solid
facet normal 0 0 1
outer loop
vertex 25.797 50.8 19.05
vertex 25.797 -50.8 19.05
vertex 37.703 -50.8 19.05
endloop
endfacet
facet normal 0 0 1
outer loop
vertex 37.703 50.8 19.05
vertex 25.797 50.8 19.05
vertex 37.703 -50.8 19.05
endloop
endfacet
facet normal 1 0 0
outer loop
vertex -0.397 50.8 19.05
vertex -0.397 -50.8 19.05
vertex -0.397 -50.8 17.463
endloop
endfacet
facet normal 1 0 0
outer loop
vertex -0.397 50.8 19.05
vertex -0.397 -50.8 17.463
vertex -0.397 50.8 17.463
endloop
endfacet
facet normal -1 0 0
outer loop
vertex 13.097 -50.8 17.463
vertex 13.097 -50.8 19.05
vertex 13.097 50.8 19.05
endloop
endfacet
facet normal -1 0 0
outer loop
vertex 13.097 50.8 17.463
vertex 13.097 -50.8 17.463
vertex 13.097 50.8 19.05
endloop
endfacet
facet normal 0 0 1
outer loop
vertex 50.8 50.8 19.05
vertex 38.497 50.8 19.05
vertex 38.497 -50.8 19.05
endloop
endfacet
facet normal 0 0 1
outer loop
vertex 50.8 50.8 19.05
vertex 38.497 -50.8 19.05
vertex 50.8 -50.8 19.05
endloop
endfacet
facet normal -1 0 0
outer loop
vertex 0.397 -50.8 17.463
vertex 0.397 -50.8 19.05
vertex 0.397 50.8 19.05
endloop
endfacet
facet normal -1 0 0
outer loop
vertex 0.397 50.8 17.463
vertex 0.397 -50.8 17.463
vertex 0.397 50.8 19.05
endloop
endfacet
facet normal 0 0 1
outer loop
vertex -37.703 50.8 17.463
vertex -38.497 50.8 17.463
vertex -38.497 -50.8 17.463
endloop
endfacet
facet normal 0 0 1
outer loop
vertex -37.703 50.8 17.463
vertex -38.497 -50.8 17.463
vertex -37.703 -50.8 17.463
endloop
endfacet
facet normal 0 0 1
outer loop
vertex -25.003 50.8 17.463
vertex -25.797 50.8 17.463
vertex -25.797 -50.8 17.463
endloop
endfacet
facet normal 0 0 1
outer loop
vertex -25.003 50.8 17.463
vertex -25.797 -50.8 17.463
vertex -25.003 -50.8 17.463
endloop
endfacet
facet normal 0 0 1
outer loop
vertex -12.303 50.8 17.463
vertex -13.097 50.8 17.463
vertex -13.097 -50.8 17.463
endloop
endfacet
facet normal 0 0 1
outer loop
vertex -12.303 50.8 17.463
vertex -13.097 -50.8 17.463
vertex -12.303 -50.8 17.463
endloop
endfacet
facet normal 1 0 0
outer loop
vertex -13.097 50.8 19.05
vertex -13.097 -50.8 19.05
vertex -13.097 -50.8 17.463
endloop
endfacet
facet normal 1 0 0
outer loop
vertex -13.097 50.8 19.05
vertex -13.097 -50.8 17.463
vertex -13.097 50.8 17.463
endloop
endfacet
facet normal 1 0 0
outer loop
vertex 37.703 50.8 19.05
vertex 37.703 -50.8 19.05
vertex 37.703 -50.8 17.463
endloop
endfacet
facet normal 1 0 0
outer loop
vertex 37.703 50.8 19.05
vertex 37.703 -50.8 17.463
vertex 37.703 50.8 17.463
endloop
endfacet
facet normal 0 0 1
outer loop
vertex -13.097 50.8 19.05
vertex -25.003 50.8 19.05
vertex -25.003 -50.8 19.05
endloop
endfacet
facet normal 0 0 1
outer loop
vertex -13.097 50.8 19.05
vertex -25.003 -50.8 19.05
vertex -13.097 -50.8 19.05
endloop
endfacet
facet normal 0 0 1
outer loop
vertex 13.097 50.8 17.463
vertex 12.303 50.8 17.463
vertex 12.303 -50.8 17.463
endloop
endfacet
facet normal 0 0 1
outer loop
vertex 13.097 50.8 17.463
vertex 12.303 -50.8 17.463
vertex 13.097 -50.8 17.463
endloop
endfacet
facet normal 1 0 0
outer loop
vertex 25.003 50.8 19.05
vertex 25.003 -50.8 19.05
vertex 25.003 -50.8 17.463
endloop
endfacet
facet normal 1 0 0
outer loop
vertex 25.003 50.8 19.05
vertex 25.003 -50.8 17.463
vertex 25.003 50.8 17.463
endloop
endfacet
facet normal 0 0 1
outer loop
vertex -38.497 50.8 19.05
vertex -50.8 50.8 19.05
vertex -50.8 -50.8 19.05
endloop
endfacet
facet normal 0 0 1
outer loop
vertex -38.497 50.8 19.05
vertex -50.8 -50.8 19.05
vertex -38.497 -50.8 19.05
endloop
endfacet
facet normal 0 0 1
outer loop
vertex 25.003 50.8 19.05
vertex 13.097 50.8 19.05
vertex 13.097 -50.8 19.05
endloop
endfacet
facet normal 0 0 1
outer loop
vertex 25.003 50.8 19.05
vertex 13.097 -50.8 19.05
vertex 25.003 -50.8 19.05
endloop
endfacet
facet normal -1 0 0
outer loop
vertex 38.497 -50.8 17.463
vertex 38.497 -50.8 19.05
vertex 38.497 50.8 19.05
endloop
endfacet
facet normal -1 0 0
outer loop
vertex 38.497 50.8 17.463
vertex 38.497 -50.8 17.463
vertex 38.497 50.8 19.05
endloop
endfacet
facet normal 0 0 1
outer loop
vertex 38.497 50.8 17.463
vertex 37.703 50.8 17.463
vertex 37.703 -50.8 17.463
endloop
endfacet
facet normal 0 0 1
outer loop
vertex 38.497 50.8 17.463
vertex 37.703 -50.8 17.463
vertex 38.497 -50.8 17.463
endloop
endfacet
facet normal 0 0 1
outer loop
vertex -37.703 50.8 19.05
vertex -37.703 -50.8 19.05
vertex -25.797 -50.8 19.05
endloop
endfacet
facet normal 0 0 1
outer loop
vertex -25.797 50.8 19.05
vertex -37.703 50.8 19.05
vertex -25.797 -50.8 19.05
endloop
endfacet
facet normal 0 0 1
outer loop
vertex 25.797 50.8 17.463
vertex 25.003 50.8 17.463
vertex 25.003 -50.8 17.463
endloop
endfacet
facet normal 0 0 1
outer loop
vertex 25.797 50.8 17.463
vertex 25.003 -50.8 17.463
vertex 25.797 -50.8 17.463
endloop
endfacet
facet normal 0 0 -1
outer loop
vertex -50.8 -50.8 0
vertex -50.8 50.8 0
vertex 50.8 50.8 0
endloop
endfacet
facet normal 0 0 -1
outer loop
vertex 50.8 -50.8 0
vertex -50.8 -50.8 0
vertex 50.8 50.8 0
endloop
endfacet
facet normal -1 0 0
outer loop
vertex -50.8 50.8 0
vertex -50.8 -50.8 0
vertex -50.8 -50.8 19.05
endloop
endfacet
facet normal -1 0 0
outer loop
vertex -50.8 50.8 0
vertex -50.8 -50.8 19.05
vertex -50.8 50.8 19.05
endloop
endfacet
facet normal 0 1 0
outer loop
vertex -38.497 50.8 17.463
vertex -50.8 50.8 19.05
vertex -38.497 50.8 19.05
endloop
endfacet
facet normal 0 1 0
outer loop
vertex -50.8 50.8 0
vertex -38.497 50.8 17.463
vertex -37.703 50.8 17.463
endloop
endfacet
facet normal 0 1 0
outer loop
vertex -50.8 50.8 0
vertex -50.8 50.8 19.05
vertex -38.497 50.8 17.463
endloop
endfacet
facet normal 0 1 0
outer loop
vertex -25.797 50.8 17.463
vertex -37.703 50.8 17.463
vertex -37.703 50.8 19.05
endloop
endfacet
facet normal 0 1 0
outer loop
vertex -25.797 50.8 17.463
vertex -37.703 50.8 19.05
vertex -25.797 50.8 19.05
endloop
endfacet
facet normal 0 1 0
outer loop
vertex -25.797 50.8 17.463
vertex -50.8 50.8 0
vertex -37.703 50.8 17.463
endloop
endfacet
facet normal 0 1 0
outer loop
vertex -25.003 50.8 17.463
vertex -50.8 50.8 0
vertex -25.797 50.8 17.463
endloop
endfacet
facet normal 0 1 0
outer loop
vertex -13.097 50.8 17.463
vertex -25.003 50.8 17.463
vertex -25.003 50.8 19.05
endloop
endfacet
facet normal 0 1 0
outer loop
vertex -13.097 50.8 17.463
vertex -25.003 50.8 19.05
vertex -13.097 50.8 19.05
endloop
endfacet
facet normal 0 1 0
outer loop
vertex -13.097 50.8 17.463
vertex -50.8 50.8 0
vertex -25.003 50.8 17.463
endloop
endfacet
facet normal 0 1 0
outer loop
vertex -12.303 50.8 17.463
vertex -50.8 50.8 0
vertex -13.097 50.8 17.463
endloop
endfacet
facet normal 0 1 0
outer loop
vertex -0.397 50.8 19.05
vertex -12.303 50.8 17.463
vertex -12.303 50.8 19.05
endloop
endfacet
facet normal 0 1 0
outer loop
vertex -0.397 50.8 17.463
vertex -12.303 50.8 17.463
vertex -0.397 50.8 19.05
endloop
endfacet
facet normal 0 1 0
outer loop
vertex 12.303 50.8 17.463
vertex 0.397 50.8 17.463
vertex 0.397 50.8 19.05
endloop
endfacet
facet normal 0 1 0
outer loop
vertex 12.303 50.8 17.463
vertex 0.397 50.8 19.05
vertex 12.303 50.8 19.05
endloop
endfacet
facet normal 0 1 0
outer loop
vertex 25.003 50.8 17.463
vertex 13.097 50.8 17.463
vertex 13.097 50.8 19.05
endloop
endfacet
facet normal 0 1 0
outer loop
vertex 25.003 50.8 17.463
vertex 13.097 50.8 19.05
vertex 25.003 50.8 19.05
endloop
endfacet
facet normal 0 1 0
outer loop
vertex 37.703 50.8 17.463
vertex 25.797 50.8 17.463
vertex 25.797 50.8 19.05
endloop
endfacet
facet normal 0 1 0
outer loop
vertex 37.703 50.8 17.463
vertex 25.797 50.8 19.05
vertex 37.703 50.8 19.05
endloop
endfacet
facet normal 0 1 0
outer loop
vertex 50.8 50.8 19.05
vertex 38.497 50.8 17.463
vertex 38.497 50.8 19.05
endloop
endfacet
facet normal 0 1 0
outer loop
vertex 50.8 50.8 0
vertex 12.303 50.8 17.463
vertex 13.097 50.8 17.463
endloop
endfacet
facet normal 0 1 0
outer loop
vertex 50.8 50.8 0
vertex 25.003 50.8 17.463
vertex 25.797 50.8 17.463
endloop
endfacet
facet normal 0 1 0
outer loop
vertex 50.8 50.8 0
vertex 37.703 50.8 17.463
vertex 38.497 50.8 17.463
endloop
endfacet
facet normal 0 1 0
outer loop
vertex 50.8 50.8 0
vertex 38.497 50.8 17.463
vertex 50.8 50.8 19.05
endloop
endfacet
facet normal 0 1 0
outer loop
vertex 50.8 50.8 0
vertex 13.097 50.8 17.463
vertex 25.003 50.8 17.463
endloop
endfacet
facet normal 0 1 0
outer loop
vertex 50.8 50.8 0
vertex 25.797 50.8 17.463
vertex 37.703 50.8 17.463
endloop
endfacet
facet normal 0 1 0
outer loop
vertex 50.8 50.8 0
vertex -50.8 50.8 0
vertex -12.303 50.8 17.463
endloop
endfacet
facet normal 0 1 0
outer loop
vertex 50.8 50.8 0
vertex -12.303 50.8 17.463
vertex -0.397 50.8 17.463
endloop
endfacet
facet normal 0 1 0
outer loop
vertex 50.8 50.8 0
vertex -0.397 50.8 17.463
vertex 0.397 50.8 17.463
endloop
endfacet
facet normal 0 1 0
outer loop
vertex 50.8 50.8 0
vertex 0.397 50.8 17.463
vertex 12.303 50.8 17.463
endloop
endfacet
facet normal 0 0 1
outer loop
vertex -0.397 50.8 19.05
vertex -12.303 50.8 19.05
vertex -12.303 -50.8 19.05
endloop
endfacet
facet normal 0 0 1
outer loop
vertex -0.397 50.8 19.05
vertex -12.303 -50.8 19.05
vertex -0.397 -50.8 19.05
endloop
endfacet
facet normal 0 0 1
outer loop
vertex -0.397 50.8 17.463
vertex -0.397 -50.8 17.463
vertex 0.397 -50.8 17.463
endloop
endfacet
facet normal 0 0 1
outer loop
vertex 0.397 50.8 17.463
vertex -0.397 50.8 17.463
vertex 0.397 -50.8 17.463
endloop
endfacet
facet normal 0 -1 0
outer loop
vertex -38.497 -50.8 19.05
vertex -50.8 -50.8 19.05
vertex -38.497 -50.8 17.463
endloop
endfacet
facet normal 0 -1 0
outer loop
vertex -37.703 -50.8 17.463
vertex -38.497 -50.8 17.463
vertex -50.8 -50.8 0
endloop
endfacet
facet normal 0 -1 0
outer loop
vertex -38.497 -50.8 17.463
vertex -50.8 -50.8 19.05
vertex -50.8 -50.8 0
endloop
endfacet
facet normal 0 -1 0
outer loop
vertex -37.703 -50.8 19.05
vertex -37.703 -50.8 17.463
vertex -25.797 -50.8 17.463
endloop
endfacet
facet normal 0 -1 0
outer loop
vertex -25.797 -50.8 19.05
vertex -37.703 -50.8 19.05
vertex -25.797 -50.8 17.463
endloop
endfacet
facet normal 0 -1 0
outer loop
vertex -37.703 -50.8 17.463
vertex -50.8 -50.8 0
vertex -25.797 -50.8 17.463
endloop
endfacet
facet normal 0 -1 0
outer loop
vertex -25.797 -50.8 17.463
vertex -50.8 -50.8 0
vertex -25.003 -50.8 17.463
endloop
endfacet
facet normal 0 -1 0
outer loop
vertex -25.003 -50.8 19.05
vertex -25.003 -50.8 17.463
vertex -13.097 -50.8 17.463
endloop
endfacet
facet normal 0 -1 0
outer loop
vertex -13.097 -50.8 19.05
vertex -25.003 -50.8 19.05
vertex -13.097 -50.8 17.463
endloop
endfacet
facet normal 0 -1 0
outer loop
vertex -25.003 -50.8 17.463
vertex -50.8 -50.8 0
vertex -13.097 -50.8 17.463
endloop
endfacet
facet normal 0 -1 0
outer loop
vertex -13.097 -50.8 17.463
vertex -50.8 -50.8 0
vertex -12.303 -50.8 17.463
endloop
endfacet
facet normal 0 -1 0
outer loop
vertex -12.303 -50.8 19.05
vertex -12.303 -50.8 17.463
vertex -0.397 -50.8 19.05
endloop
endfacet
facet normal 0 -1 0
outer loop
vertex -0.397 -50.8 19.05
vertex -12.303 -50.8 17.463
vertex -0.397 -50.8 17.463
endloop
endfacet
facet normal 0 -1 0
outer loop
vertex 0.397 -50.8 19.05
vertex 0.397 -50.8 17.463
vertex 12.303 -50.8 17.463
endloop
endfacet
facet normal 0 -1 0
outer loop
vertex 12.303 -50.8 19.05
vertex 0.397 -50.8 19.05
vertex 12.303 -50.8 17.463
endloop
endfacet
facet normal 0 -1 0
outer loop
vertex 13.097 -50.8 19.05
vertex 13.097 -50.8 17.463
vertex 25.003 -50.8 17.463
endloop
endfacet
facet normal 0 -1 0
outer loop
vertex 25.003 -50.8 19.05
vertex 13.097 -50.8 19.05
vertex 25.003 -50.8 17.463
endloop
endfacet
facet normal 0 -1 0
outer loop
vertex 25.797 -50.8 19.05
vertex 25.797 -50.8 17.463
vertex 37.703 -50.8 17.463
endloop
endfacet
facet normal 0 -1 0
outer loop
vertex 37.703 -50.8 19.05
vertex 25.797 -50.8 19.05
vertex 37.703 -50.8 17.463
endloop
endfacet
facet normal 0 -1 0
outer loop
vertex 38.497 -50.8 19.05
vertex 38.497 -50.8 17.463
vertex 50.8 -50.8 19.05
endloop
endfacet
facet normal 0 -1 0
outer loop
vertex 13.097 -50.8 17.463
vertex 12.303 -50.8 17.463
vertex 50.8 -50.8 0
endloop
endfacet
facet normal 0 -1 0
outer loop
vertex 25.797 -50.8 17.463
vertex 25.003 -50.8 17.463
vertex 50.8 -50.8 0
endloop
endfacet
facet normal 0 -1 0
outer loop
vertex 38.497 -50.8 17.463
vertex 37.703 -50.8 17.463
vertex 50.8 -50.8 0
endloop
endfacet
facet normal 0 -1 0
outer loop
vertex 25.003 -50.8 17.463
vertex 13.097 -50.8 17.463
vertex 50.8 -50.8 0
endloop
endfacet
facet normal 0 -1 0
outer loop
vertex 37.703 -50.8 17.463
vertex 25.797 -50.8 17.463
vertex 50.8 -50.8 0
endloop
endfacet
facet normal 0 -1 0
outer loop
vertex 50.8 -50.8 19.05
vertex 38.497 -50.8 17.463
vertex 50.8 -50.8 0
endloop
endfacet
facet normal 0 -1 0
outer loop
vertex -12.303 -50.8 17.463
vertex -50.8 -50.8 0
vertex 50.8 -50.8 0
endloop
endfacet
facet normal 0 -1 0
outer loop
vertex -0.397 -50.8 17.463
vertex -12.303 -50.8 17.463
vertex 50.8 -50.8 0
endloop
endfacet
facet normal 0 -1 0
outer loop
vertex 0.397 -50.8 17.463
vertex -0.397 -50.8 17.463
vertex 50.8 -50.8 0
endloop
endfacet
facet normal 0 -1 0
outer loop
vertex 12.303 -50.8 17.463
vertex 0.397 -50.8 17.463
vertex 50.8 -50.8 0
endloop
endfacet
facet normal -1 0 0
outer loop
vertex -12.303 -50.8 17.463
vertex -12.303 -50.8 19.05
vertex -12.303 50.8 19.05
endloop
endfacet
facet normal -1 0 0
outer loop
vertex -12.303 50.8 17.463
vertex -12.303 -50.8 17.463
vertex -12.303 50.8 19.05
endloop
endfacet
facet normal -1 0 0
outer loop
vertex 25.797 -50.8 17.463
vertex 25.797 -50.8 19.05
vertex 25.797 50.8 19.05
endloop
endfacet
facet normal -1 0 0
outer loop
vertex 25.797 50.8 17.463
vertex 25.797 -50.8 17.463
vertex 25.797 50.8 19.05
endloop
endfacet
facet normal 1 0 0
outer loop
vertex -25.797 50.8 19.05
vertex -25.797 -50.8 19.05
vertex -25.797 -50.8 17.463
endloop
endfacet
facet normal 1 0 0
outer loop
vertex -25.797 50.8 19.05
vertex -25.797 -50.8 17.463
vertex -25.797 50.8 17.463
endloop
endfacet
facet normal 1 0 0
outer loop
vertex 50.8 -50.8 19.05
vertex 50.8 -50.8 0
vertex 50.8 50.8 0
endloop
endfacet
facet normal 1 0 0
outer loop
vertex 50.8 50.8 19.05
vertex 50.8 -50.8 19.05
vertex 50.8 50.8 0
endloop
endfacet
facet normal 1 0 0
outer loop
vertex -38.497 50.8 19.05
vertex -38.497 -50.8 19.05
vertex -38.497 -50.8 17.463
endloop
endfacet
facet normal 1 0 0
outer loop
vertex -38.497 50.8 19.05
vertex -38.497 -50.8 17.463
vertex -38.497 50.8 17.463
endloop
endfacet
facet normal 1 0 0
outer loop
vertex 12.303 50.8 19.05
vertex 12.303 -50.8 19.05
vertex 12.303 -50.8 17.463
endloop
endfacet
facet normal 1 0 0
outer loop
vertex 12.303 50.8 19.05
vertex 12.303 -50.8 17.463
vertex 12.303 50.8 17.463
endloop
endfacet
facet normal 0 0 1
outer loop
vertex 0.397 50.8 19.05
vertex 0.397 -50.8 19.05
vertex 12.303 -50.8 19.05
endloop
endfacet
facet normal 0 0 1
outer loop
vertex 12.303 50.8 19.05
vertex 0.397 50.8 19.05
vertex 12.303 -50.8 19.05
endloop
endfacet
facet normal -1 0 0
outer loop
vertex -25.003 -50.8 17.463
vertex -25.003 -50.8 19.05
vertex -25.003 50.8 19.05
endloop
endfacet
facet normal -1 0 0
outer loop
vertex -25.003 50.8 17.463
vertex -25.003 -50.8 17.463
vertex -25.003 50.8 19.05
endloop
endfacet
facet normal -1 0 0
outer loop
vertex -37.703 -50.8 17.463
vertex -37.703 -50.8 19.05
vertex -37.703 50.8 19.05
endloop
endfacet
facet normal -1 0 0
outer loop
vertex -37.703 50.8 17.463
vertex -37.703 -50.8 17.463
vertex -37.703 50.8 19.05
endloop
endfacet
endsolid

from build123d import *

# Parameters (mm, degrees)
F0_W     = 101.6
F0_H     = 101.6
F1_DEPTH = 19.05
F2_W     = 0.396875
F2_H     = 101.6
F3_DEPTH = 1.5875


# Not quite as in the source:
# - a length typed as a fraction of an inch, garbled in the dataset ("3 / 203.2 mm" for 3/8 in), is restored


with BuildPart() as f1:
    # F0 (on Top) → F1 (new body)
    with BuildSketch(Plane.XY):
        Rectangle(F0_W, F0_H)
    extrude(amount=F1_DEPTH)

    # F2 (on face) → F3 (cut)
    with BuildSketch(Plane.XY.offset(19.05)):
        with Locations((-38.2984375, 0)):
            Rectangle(F2_W, F2_H)
        with Locations((-37.9015625, 0)):
            Rectangle(F2_W, F2_H)
        with Locations((-25.5984375, 0)):
            Rectangle(F2_W, F2_H)
        with Locations((-25.2015625, 0)):
            Rectangle(F2_W, F2_H)
        with Locations((-12.8984375, 0)):
            Rectangle(F2_W, F2_H)
        with Locations((-12.5015625, 0)):
            Rectangle(F2_W, F2_H)
        with Locations((-0.1984375, 0)):
            Rectangle(F2_W, F2_H)
        with Locations((0.1984375, 0)):
            Rectangle(F2_W, F2_H)
        with Locations((12.5015625, 0)):
            Rectangle(F2_W, F2_H)
        with Locations((12.8984375, 0)):
            Rectangle(F2_W, F2_H)
        with Locations((25.2015625, 0)):
            Rectangle(F2_W, F2_H)
        with Locations((25.5984375, 0)):
            Rectangle(F2_W, F2_H)
        with Locations((37.9015625, 0)):
            Rectangle(F2_W, F2_H)
        with Locations((38.2984375, 0)):
            Rectangle(F2_W, F2_H)
    extrude(amount=-F3_DEPTH, mode=Mode.SUBTRACT)


solid = f1.part
